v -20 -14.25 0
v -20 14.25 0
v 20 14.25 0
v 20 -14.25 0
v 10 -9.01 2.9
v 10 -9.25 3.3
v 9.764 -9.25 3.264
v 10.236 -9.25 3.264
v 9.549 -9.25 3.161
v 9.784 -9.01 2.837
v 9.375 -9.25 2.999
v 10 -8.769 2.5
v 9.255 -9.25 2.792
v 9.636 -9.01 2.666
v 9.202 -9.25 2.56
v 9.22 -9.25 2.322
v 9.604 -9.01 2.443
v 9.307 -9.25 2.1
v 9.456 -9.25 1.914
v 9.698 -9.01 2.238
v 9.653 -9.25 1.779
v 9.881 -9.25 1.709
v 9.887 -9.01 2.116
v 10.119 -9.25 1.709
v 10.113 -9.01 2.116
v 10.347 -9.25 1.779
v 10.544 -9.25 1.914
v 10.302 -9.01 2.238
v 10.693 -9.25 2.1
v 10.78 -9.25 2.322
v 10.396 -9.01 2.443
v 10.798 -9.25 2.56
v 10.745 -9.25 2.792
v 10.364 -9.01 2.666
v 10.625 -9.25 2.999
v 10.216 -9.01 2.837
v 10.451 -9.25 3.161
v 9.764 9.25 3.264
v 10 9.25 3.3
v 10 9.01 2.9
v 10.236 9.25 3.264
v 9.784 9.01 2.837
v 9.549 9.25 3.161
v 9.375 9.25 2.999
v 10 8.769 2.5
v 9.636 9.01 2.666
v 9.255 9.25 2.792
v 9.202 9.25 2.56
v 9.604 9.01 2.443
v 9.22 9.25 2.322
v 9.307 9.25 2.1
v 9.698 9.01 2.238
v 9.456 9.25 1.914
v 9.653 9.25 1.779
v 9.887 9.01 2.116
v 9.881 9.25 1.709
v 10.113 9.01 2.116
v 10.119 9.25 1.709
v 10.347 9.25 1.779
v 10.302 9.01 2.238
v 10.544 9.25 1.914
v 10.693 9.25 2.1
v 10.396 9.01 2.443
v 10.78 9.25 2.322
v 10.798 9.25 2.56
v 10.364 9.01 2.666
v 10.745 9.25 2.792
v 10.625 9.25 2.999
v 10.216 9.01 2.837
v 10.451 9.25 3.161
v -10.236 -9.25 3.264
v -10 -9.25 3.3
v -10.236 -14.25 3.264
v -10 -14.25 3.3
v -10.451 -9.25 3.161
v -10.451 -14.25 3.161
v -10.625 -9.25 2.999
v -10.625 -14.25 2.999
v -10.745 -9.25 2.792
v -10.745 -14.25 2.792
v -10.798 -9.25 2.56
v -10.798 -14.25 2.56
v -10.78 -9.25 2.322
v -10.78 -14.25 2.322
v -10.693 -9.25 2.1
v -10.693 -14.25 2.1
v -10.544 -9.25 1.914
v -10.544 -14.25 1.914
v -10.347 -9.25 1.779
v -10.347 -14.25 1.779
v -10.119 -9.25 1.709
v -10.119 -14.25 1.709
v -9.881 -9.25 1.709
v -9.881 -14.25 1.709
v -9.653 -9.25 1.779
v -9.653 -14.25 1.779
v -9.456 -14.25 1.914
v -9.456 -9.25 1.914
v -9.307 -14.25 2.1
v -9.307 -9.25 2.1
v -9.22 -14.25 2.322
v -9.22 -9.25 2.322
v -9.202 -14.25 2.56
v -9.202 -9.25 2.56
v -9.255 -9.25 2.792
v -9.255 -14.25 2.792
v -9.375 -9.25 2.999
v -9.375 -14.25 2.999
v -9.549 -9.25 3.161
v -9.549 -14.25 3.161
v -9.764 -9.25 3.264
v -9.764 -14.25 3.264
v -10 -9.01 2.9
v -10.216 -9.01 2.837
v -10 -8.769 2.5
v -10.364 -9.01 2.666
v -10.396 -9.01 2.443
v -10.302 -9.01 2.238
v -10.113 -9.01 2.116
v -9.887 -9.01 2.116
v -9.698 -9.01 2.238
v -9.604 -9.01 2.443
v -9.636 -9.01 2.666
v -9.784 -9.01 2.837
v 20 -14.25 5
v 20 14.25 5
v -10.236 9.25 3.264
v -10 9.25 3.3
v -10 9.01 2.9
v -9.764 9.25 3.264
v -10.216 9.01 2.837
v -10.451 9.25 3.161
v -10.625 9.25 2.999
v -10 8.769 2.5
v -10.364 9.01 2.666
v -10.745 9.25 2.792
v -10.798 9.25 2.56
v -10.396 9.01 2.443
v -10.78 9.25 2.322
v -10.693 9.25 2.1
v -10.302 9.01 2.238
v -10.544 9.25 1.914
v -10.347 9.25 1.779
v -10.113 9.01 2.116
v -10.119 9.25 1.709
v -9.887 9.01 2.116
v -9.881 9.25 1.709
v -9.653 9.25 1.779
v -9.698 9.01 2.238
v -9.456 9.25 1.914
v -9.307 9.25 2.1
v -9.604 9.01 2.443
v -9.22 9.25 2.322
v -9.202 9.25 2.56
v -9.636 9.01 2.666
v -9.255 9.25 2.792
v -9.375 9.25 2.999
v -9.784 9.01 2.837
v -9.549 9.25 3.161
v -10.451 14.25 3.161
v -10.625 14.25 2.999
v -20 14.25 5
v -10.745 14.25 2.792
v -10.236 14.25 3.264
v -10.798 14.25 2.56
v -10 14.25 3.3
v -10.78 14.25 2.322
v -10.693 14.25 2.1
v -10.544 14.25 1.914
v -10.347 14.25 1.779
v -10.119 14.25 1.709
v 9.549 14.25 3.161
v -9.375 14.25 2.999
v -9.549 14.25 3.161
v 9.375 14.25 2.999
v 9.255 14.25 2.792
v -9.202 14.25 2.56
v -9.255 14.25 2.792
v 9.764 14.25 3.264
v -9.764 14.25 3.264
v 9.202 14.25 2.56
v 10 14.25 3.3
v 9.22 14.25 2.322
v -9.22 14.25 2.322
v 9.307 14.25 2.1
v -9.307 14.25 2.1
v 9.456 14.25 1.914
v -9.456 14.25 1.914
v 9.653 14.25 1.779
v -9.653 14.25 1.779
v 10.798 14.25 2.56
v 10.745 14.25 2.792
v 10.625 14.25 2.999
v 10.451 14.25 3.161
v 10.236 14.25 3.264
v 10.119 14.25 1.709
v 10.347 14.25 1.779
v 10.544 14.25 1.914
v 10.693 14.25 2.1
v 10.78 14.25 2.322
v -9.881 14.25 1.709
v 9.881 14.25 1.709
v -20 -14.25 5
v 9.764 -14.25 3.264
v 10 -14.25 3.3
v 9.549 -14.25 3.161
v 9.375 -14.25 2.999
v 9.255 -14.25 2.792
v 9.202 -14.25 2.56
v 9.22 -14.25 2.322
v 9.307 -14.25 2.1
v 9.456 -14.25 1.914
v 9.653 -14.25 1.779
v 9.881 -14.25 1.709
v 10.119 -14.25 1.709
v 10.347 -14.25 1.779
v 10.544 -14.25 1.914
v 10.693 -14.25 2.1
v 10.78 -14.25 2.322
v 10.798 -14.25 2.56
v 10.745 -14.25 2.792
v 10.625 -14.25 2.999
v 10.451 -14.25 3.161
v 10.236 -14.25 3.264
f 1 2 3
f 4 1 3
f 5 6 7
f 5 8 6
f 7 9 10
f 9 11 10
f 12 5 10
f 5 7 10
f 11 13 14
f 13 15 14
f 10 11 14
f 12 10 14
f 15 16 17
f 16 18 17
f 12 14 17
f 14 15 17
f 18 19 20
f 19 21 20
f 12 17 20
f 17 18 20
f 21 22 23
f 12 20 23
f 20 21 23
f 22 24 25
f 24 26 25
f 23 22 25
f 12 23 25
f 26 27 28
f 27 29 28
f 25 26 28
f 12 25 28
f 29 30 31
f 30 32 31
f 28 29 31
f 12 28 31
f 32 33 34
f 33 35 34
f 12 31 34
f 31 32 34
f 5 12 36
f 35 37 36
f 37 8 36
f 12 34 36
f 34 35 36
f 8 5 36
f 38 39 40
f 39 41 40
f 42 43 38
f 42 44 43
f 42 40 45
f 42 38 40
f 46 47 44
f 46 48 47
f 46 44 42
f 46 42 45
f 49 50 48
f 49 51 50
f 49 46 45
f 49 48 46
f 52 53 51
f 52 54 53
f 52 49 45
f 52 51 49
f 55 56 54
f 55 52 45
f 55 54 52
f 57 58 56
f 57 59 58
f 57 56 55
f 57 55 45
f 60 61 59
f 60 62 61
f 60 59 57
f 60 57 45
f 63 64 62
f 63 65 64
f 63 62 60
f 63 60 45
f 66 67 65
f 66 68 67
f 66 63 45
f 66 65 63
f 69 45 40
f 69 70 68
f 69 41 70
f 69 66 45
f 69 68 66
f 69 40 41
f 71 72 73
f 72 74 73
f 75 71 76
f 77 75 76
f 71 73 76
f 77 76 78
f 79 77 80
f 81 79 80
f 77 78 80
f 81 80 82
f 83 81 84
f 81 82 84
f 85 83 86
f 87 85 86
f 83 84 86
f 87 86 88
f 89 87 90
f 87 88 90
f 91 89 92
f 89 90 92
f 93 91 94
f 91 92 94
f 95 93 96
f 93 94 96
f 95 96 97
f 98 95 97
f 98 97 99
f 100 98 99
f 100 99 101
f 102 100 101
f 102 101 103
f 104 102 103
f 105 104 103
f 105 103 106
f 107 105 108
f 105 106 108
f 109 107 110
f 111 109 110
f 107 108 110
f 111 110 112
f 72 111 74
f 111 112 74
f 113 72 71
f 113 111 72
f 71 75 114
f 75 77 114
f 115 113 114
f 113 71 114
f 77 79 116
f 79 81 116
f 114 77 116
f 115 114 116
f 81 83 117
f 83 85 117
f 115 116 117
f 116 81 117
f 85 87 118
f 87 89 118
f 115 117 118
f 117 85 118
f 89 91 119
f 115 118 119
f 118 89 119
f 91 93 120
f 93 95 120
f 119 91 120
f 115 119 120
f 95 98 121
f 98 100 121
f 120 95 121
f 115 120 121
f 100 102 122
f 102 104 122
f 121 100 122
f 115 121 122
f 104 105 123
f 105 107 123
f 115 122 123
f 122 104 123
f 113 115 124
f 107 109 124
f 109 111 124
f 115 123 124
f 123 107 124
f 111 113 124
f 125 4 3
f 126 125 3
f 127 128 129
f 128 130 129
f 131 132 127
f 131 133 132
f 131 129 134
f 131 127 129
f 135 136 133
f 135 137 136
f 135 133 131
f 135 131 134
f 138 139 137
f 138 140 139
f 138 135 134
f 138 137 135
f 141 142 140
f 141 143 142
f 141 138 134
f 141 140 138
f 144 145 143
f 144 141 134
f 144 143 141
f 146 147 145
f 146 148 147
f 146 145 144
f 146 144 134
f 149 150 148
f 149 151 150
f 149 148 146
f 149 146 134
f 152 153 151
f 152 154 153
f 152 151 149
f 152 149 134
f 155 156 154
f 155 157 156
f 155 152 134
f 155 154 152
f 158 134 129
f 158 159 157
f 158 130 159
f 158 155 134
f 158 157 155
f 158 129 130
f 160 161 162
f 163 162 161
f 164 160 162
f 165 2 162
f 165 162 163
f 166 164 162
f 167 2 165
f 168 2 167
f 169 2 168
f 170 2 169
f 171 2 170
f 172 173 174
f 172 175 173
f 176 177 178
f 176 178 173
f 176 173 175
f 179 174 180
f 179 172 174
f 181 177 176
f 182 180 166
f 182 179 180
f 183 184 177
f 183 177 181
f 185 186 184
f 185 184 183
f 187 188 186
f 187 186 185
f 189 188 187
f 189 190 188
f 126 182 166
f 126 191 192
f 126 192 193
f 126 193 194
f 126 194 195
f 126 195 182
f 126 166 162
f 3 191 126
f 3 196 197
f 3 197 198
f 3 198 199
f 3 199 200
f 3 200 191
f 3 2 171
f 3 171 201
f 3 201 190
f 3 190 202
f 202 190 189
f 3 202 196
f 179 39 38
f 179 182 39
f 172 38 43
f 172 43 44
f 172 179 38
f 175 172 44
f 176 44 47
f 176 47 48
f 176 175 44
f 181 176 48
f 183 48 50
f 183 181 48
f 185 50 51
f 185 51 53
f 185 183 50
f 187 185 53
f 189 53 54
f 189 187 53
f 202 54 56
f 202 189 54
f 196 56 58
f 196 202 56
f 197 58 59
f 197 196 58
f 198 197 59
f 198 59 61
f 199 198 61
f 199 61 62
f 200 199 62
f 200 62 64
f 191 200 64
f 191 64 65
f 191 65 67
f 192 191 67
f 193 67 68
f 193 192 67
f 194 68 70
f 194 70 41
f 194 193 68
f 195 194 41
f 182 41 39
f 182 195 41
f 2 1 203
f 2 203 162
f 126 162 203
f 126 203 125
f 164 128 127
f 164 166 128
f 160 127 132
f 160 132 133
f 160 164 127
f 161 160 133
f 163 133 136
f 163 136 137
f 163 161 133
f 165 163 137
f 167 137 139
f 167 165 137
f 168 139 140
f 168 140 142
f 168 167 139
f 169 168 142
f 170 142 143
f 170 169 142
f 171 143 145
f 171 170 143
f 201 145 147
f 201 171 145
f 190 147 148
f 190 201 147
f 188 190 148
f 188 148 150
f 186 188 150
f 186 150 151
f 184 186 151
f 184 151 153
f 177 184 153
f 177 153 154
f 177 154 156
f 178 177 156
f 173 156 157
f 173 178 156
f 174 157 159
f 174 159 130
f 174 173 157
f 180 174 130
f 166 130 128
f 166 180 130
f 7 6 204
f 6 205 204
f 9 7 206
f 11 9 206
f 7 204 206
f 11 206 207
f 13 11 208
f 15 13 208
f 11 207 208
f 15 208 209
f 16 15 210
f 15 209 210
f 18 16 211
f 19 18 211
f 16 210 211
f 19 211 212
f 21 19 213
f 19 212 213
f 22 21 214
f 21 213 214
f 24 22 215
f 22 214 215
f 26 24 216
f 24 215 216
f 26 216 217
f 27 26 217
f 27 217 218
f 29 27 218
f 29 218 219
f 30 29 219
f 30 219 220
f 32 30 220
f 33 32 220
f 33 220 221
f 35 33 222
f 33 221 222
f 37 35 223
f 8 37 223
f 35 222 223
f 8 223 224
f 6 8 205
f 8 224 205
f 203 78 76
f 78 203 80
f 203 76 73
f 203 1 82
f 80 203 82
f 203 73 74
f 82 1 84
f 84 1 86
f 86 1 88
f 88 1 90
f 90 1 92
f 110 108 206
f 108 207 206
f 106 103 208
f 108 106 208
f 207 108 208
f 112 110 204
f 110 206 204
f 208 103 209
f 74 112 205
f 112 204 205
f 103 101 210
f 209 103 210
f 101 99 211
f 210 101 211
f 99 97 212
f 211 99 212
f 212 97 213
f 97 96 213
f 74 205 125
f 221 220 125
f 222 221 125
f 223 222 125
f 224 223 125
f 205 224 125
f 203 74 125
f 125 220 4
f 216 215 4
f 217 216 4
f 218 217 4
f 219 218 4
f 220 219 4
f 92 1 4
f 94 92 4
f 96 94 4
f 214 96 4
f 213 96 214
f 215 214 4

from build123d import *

# Parameters (mm, degrees)
SKETCH1_W                  = 40
SKETCH1_H                  = 28.5
BOSS_EXTRUDE1_DEPTH        = 5
M2_TAPPED_HOLE1_AT_2_COUNT = 2
M2_TAPPED_HOLE1_AT_2_PITCH = 20


with BuildPart() as part:
    # Sketch1 → Boss-Extrude1 (new body)
    with BuildSketch(Plane.XY):
        Rectangle(SKETCH1_W, SKETCH1_H)
    extrude(amount=BOSS_EXTRUDE1_DEPTH)

    # Sketch4 → M2 Tapped Hole1 (revolve, cut)
    with BuildSketch(Plane(origin=(-10, 14.25, 2.5), x_dir=(0, 0, 1), z_dir=(1, 0, 0))):
        Polygon((0, 0), (0, 5.480688495), (0.8, 5), (0.8, 0), align=None)
    m2_tapped_hole1 = revolve(axis=Axis((-10, 20.6, 2.5), (0, -1, 0)), mode=Mode.SUBTRACT)

    # M2 Tapped Hole1 at 2: M2 Tapped Hole1 ×2
    with Locations(*[(i * M2_TAPPED_HOLE1_AT_2_PITCH, 0, 0) for i in range(1, M2_TAPPED_HOLE1_AT_2_COUNT)]):
        add(m2_tapped_hole1, mode=Mode.SUBTRACT)

    # Mirror1: M2 Tapped Hole1 across plane
    add(m2_tapped_hole1.mirror(Plane.ZX), mode=Mode.SUBTRACT)

    # Mirror1 copy 1 sketch → Mirror1 copy 1 (revolve, cut)
    with BuildSketch(Plane(origin=(10, -14.25, 2.5), x_dir=(0, 0, 1), z_dir=(1, 0, 0))):
        Polygon((0, 0), (0, -5.480688495), (0.8, -5), (0.8, 0), align=None)
    revolve(axis=Axis((10, -20.6, 2.5), (0, -1, 0)), mode=Mode.SUBTRACT)


solid = part.part
